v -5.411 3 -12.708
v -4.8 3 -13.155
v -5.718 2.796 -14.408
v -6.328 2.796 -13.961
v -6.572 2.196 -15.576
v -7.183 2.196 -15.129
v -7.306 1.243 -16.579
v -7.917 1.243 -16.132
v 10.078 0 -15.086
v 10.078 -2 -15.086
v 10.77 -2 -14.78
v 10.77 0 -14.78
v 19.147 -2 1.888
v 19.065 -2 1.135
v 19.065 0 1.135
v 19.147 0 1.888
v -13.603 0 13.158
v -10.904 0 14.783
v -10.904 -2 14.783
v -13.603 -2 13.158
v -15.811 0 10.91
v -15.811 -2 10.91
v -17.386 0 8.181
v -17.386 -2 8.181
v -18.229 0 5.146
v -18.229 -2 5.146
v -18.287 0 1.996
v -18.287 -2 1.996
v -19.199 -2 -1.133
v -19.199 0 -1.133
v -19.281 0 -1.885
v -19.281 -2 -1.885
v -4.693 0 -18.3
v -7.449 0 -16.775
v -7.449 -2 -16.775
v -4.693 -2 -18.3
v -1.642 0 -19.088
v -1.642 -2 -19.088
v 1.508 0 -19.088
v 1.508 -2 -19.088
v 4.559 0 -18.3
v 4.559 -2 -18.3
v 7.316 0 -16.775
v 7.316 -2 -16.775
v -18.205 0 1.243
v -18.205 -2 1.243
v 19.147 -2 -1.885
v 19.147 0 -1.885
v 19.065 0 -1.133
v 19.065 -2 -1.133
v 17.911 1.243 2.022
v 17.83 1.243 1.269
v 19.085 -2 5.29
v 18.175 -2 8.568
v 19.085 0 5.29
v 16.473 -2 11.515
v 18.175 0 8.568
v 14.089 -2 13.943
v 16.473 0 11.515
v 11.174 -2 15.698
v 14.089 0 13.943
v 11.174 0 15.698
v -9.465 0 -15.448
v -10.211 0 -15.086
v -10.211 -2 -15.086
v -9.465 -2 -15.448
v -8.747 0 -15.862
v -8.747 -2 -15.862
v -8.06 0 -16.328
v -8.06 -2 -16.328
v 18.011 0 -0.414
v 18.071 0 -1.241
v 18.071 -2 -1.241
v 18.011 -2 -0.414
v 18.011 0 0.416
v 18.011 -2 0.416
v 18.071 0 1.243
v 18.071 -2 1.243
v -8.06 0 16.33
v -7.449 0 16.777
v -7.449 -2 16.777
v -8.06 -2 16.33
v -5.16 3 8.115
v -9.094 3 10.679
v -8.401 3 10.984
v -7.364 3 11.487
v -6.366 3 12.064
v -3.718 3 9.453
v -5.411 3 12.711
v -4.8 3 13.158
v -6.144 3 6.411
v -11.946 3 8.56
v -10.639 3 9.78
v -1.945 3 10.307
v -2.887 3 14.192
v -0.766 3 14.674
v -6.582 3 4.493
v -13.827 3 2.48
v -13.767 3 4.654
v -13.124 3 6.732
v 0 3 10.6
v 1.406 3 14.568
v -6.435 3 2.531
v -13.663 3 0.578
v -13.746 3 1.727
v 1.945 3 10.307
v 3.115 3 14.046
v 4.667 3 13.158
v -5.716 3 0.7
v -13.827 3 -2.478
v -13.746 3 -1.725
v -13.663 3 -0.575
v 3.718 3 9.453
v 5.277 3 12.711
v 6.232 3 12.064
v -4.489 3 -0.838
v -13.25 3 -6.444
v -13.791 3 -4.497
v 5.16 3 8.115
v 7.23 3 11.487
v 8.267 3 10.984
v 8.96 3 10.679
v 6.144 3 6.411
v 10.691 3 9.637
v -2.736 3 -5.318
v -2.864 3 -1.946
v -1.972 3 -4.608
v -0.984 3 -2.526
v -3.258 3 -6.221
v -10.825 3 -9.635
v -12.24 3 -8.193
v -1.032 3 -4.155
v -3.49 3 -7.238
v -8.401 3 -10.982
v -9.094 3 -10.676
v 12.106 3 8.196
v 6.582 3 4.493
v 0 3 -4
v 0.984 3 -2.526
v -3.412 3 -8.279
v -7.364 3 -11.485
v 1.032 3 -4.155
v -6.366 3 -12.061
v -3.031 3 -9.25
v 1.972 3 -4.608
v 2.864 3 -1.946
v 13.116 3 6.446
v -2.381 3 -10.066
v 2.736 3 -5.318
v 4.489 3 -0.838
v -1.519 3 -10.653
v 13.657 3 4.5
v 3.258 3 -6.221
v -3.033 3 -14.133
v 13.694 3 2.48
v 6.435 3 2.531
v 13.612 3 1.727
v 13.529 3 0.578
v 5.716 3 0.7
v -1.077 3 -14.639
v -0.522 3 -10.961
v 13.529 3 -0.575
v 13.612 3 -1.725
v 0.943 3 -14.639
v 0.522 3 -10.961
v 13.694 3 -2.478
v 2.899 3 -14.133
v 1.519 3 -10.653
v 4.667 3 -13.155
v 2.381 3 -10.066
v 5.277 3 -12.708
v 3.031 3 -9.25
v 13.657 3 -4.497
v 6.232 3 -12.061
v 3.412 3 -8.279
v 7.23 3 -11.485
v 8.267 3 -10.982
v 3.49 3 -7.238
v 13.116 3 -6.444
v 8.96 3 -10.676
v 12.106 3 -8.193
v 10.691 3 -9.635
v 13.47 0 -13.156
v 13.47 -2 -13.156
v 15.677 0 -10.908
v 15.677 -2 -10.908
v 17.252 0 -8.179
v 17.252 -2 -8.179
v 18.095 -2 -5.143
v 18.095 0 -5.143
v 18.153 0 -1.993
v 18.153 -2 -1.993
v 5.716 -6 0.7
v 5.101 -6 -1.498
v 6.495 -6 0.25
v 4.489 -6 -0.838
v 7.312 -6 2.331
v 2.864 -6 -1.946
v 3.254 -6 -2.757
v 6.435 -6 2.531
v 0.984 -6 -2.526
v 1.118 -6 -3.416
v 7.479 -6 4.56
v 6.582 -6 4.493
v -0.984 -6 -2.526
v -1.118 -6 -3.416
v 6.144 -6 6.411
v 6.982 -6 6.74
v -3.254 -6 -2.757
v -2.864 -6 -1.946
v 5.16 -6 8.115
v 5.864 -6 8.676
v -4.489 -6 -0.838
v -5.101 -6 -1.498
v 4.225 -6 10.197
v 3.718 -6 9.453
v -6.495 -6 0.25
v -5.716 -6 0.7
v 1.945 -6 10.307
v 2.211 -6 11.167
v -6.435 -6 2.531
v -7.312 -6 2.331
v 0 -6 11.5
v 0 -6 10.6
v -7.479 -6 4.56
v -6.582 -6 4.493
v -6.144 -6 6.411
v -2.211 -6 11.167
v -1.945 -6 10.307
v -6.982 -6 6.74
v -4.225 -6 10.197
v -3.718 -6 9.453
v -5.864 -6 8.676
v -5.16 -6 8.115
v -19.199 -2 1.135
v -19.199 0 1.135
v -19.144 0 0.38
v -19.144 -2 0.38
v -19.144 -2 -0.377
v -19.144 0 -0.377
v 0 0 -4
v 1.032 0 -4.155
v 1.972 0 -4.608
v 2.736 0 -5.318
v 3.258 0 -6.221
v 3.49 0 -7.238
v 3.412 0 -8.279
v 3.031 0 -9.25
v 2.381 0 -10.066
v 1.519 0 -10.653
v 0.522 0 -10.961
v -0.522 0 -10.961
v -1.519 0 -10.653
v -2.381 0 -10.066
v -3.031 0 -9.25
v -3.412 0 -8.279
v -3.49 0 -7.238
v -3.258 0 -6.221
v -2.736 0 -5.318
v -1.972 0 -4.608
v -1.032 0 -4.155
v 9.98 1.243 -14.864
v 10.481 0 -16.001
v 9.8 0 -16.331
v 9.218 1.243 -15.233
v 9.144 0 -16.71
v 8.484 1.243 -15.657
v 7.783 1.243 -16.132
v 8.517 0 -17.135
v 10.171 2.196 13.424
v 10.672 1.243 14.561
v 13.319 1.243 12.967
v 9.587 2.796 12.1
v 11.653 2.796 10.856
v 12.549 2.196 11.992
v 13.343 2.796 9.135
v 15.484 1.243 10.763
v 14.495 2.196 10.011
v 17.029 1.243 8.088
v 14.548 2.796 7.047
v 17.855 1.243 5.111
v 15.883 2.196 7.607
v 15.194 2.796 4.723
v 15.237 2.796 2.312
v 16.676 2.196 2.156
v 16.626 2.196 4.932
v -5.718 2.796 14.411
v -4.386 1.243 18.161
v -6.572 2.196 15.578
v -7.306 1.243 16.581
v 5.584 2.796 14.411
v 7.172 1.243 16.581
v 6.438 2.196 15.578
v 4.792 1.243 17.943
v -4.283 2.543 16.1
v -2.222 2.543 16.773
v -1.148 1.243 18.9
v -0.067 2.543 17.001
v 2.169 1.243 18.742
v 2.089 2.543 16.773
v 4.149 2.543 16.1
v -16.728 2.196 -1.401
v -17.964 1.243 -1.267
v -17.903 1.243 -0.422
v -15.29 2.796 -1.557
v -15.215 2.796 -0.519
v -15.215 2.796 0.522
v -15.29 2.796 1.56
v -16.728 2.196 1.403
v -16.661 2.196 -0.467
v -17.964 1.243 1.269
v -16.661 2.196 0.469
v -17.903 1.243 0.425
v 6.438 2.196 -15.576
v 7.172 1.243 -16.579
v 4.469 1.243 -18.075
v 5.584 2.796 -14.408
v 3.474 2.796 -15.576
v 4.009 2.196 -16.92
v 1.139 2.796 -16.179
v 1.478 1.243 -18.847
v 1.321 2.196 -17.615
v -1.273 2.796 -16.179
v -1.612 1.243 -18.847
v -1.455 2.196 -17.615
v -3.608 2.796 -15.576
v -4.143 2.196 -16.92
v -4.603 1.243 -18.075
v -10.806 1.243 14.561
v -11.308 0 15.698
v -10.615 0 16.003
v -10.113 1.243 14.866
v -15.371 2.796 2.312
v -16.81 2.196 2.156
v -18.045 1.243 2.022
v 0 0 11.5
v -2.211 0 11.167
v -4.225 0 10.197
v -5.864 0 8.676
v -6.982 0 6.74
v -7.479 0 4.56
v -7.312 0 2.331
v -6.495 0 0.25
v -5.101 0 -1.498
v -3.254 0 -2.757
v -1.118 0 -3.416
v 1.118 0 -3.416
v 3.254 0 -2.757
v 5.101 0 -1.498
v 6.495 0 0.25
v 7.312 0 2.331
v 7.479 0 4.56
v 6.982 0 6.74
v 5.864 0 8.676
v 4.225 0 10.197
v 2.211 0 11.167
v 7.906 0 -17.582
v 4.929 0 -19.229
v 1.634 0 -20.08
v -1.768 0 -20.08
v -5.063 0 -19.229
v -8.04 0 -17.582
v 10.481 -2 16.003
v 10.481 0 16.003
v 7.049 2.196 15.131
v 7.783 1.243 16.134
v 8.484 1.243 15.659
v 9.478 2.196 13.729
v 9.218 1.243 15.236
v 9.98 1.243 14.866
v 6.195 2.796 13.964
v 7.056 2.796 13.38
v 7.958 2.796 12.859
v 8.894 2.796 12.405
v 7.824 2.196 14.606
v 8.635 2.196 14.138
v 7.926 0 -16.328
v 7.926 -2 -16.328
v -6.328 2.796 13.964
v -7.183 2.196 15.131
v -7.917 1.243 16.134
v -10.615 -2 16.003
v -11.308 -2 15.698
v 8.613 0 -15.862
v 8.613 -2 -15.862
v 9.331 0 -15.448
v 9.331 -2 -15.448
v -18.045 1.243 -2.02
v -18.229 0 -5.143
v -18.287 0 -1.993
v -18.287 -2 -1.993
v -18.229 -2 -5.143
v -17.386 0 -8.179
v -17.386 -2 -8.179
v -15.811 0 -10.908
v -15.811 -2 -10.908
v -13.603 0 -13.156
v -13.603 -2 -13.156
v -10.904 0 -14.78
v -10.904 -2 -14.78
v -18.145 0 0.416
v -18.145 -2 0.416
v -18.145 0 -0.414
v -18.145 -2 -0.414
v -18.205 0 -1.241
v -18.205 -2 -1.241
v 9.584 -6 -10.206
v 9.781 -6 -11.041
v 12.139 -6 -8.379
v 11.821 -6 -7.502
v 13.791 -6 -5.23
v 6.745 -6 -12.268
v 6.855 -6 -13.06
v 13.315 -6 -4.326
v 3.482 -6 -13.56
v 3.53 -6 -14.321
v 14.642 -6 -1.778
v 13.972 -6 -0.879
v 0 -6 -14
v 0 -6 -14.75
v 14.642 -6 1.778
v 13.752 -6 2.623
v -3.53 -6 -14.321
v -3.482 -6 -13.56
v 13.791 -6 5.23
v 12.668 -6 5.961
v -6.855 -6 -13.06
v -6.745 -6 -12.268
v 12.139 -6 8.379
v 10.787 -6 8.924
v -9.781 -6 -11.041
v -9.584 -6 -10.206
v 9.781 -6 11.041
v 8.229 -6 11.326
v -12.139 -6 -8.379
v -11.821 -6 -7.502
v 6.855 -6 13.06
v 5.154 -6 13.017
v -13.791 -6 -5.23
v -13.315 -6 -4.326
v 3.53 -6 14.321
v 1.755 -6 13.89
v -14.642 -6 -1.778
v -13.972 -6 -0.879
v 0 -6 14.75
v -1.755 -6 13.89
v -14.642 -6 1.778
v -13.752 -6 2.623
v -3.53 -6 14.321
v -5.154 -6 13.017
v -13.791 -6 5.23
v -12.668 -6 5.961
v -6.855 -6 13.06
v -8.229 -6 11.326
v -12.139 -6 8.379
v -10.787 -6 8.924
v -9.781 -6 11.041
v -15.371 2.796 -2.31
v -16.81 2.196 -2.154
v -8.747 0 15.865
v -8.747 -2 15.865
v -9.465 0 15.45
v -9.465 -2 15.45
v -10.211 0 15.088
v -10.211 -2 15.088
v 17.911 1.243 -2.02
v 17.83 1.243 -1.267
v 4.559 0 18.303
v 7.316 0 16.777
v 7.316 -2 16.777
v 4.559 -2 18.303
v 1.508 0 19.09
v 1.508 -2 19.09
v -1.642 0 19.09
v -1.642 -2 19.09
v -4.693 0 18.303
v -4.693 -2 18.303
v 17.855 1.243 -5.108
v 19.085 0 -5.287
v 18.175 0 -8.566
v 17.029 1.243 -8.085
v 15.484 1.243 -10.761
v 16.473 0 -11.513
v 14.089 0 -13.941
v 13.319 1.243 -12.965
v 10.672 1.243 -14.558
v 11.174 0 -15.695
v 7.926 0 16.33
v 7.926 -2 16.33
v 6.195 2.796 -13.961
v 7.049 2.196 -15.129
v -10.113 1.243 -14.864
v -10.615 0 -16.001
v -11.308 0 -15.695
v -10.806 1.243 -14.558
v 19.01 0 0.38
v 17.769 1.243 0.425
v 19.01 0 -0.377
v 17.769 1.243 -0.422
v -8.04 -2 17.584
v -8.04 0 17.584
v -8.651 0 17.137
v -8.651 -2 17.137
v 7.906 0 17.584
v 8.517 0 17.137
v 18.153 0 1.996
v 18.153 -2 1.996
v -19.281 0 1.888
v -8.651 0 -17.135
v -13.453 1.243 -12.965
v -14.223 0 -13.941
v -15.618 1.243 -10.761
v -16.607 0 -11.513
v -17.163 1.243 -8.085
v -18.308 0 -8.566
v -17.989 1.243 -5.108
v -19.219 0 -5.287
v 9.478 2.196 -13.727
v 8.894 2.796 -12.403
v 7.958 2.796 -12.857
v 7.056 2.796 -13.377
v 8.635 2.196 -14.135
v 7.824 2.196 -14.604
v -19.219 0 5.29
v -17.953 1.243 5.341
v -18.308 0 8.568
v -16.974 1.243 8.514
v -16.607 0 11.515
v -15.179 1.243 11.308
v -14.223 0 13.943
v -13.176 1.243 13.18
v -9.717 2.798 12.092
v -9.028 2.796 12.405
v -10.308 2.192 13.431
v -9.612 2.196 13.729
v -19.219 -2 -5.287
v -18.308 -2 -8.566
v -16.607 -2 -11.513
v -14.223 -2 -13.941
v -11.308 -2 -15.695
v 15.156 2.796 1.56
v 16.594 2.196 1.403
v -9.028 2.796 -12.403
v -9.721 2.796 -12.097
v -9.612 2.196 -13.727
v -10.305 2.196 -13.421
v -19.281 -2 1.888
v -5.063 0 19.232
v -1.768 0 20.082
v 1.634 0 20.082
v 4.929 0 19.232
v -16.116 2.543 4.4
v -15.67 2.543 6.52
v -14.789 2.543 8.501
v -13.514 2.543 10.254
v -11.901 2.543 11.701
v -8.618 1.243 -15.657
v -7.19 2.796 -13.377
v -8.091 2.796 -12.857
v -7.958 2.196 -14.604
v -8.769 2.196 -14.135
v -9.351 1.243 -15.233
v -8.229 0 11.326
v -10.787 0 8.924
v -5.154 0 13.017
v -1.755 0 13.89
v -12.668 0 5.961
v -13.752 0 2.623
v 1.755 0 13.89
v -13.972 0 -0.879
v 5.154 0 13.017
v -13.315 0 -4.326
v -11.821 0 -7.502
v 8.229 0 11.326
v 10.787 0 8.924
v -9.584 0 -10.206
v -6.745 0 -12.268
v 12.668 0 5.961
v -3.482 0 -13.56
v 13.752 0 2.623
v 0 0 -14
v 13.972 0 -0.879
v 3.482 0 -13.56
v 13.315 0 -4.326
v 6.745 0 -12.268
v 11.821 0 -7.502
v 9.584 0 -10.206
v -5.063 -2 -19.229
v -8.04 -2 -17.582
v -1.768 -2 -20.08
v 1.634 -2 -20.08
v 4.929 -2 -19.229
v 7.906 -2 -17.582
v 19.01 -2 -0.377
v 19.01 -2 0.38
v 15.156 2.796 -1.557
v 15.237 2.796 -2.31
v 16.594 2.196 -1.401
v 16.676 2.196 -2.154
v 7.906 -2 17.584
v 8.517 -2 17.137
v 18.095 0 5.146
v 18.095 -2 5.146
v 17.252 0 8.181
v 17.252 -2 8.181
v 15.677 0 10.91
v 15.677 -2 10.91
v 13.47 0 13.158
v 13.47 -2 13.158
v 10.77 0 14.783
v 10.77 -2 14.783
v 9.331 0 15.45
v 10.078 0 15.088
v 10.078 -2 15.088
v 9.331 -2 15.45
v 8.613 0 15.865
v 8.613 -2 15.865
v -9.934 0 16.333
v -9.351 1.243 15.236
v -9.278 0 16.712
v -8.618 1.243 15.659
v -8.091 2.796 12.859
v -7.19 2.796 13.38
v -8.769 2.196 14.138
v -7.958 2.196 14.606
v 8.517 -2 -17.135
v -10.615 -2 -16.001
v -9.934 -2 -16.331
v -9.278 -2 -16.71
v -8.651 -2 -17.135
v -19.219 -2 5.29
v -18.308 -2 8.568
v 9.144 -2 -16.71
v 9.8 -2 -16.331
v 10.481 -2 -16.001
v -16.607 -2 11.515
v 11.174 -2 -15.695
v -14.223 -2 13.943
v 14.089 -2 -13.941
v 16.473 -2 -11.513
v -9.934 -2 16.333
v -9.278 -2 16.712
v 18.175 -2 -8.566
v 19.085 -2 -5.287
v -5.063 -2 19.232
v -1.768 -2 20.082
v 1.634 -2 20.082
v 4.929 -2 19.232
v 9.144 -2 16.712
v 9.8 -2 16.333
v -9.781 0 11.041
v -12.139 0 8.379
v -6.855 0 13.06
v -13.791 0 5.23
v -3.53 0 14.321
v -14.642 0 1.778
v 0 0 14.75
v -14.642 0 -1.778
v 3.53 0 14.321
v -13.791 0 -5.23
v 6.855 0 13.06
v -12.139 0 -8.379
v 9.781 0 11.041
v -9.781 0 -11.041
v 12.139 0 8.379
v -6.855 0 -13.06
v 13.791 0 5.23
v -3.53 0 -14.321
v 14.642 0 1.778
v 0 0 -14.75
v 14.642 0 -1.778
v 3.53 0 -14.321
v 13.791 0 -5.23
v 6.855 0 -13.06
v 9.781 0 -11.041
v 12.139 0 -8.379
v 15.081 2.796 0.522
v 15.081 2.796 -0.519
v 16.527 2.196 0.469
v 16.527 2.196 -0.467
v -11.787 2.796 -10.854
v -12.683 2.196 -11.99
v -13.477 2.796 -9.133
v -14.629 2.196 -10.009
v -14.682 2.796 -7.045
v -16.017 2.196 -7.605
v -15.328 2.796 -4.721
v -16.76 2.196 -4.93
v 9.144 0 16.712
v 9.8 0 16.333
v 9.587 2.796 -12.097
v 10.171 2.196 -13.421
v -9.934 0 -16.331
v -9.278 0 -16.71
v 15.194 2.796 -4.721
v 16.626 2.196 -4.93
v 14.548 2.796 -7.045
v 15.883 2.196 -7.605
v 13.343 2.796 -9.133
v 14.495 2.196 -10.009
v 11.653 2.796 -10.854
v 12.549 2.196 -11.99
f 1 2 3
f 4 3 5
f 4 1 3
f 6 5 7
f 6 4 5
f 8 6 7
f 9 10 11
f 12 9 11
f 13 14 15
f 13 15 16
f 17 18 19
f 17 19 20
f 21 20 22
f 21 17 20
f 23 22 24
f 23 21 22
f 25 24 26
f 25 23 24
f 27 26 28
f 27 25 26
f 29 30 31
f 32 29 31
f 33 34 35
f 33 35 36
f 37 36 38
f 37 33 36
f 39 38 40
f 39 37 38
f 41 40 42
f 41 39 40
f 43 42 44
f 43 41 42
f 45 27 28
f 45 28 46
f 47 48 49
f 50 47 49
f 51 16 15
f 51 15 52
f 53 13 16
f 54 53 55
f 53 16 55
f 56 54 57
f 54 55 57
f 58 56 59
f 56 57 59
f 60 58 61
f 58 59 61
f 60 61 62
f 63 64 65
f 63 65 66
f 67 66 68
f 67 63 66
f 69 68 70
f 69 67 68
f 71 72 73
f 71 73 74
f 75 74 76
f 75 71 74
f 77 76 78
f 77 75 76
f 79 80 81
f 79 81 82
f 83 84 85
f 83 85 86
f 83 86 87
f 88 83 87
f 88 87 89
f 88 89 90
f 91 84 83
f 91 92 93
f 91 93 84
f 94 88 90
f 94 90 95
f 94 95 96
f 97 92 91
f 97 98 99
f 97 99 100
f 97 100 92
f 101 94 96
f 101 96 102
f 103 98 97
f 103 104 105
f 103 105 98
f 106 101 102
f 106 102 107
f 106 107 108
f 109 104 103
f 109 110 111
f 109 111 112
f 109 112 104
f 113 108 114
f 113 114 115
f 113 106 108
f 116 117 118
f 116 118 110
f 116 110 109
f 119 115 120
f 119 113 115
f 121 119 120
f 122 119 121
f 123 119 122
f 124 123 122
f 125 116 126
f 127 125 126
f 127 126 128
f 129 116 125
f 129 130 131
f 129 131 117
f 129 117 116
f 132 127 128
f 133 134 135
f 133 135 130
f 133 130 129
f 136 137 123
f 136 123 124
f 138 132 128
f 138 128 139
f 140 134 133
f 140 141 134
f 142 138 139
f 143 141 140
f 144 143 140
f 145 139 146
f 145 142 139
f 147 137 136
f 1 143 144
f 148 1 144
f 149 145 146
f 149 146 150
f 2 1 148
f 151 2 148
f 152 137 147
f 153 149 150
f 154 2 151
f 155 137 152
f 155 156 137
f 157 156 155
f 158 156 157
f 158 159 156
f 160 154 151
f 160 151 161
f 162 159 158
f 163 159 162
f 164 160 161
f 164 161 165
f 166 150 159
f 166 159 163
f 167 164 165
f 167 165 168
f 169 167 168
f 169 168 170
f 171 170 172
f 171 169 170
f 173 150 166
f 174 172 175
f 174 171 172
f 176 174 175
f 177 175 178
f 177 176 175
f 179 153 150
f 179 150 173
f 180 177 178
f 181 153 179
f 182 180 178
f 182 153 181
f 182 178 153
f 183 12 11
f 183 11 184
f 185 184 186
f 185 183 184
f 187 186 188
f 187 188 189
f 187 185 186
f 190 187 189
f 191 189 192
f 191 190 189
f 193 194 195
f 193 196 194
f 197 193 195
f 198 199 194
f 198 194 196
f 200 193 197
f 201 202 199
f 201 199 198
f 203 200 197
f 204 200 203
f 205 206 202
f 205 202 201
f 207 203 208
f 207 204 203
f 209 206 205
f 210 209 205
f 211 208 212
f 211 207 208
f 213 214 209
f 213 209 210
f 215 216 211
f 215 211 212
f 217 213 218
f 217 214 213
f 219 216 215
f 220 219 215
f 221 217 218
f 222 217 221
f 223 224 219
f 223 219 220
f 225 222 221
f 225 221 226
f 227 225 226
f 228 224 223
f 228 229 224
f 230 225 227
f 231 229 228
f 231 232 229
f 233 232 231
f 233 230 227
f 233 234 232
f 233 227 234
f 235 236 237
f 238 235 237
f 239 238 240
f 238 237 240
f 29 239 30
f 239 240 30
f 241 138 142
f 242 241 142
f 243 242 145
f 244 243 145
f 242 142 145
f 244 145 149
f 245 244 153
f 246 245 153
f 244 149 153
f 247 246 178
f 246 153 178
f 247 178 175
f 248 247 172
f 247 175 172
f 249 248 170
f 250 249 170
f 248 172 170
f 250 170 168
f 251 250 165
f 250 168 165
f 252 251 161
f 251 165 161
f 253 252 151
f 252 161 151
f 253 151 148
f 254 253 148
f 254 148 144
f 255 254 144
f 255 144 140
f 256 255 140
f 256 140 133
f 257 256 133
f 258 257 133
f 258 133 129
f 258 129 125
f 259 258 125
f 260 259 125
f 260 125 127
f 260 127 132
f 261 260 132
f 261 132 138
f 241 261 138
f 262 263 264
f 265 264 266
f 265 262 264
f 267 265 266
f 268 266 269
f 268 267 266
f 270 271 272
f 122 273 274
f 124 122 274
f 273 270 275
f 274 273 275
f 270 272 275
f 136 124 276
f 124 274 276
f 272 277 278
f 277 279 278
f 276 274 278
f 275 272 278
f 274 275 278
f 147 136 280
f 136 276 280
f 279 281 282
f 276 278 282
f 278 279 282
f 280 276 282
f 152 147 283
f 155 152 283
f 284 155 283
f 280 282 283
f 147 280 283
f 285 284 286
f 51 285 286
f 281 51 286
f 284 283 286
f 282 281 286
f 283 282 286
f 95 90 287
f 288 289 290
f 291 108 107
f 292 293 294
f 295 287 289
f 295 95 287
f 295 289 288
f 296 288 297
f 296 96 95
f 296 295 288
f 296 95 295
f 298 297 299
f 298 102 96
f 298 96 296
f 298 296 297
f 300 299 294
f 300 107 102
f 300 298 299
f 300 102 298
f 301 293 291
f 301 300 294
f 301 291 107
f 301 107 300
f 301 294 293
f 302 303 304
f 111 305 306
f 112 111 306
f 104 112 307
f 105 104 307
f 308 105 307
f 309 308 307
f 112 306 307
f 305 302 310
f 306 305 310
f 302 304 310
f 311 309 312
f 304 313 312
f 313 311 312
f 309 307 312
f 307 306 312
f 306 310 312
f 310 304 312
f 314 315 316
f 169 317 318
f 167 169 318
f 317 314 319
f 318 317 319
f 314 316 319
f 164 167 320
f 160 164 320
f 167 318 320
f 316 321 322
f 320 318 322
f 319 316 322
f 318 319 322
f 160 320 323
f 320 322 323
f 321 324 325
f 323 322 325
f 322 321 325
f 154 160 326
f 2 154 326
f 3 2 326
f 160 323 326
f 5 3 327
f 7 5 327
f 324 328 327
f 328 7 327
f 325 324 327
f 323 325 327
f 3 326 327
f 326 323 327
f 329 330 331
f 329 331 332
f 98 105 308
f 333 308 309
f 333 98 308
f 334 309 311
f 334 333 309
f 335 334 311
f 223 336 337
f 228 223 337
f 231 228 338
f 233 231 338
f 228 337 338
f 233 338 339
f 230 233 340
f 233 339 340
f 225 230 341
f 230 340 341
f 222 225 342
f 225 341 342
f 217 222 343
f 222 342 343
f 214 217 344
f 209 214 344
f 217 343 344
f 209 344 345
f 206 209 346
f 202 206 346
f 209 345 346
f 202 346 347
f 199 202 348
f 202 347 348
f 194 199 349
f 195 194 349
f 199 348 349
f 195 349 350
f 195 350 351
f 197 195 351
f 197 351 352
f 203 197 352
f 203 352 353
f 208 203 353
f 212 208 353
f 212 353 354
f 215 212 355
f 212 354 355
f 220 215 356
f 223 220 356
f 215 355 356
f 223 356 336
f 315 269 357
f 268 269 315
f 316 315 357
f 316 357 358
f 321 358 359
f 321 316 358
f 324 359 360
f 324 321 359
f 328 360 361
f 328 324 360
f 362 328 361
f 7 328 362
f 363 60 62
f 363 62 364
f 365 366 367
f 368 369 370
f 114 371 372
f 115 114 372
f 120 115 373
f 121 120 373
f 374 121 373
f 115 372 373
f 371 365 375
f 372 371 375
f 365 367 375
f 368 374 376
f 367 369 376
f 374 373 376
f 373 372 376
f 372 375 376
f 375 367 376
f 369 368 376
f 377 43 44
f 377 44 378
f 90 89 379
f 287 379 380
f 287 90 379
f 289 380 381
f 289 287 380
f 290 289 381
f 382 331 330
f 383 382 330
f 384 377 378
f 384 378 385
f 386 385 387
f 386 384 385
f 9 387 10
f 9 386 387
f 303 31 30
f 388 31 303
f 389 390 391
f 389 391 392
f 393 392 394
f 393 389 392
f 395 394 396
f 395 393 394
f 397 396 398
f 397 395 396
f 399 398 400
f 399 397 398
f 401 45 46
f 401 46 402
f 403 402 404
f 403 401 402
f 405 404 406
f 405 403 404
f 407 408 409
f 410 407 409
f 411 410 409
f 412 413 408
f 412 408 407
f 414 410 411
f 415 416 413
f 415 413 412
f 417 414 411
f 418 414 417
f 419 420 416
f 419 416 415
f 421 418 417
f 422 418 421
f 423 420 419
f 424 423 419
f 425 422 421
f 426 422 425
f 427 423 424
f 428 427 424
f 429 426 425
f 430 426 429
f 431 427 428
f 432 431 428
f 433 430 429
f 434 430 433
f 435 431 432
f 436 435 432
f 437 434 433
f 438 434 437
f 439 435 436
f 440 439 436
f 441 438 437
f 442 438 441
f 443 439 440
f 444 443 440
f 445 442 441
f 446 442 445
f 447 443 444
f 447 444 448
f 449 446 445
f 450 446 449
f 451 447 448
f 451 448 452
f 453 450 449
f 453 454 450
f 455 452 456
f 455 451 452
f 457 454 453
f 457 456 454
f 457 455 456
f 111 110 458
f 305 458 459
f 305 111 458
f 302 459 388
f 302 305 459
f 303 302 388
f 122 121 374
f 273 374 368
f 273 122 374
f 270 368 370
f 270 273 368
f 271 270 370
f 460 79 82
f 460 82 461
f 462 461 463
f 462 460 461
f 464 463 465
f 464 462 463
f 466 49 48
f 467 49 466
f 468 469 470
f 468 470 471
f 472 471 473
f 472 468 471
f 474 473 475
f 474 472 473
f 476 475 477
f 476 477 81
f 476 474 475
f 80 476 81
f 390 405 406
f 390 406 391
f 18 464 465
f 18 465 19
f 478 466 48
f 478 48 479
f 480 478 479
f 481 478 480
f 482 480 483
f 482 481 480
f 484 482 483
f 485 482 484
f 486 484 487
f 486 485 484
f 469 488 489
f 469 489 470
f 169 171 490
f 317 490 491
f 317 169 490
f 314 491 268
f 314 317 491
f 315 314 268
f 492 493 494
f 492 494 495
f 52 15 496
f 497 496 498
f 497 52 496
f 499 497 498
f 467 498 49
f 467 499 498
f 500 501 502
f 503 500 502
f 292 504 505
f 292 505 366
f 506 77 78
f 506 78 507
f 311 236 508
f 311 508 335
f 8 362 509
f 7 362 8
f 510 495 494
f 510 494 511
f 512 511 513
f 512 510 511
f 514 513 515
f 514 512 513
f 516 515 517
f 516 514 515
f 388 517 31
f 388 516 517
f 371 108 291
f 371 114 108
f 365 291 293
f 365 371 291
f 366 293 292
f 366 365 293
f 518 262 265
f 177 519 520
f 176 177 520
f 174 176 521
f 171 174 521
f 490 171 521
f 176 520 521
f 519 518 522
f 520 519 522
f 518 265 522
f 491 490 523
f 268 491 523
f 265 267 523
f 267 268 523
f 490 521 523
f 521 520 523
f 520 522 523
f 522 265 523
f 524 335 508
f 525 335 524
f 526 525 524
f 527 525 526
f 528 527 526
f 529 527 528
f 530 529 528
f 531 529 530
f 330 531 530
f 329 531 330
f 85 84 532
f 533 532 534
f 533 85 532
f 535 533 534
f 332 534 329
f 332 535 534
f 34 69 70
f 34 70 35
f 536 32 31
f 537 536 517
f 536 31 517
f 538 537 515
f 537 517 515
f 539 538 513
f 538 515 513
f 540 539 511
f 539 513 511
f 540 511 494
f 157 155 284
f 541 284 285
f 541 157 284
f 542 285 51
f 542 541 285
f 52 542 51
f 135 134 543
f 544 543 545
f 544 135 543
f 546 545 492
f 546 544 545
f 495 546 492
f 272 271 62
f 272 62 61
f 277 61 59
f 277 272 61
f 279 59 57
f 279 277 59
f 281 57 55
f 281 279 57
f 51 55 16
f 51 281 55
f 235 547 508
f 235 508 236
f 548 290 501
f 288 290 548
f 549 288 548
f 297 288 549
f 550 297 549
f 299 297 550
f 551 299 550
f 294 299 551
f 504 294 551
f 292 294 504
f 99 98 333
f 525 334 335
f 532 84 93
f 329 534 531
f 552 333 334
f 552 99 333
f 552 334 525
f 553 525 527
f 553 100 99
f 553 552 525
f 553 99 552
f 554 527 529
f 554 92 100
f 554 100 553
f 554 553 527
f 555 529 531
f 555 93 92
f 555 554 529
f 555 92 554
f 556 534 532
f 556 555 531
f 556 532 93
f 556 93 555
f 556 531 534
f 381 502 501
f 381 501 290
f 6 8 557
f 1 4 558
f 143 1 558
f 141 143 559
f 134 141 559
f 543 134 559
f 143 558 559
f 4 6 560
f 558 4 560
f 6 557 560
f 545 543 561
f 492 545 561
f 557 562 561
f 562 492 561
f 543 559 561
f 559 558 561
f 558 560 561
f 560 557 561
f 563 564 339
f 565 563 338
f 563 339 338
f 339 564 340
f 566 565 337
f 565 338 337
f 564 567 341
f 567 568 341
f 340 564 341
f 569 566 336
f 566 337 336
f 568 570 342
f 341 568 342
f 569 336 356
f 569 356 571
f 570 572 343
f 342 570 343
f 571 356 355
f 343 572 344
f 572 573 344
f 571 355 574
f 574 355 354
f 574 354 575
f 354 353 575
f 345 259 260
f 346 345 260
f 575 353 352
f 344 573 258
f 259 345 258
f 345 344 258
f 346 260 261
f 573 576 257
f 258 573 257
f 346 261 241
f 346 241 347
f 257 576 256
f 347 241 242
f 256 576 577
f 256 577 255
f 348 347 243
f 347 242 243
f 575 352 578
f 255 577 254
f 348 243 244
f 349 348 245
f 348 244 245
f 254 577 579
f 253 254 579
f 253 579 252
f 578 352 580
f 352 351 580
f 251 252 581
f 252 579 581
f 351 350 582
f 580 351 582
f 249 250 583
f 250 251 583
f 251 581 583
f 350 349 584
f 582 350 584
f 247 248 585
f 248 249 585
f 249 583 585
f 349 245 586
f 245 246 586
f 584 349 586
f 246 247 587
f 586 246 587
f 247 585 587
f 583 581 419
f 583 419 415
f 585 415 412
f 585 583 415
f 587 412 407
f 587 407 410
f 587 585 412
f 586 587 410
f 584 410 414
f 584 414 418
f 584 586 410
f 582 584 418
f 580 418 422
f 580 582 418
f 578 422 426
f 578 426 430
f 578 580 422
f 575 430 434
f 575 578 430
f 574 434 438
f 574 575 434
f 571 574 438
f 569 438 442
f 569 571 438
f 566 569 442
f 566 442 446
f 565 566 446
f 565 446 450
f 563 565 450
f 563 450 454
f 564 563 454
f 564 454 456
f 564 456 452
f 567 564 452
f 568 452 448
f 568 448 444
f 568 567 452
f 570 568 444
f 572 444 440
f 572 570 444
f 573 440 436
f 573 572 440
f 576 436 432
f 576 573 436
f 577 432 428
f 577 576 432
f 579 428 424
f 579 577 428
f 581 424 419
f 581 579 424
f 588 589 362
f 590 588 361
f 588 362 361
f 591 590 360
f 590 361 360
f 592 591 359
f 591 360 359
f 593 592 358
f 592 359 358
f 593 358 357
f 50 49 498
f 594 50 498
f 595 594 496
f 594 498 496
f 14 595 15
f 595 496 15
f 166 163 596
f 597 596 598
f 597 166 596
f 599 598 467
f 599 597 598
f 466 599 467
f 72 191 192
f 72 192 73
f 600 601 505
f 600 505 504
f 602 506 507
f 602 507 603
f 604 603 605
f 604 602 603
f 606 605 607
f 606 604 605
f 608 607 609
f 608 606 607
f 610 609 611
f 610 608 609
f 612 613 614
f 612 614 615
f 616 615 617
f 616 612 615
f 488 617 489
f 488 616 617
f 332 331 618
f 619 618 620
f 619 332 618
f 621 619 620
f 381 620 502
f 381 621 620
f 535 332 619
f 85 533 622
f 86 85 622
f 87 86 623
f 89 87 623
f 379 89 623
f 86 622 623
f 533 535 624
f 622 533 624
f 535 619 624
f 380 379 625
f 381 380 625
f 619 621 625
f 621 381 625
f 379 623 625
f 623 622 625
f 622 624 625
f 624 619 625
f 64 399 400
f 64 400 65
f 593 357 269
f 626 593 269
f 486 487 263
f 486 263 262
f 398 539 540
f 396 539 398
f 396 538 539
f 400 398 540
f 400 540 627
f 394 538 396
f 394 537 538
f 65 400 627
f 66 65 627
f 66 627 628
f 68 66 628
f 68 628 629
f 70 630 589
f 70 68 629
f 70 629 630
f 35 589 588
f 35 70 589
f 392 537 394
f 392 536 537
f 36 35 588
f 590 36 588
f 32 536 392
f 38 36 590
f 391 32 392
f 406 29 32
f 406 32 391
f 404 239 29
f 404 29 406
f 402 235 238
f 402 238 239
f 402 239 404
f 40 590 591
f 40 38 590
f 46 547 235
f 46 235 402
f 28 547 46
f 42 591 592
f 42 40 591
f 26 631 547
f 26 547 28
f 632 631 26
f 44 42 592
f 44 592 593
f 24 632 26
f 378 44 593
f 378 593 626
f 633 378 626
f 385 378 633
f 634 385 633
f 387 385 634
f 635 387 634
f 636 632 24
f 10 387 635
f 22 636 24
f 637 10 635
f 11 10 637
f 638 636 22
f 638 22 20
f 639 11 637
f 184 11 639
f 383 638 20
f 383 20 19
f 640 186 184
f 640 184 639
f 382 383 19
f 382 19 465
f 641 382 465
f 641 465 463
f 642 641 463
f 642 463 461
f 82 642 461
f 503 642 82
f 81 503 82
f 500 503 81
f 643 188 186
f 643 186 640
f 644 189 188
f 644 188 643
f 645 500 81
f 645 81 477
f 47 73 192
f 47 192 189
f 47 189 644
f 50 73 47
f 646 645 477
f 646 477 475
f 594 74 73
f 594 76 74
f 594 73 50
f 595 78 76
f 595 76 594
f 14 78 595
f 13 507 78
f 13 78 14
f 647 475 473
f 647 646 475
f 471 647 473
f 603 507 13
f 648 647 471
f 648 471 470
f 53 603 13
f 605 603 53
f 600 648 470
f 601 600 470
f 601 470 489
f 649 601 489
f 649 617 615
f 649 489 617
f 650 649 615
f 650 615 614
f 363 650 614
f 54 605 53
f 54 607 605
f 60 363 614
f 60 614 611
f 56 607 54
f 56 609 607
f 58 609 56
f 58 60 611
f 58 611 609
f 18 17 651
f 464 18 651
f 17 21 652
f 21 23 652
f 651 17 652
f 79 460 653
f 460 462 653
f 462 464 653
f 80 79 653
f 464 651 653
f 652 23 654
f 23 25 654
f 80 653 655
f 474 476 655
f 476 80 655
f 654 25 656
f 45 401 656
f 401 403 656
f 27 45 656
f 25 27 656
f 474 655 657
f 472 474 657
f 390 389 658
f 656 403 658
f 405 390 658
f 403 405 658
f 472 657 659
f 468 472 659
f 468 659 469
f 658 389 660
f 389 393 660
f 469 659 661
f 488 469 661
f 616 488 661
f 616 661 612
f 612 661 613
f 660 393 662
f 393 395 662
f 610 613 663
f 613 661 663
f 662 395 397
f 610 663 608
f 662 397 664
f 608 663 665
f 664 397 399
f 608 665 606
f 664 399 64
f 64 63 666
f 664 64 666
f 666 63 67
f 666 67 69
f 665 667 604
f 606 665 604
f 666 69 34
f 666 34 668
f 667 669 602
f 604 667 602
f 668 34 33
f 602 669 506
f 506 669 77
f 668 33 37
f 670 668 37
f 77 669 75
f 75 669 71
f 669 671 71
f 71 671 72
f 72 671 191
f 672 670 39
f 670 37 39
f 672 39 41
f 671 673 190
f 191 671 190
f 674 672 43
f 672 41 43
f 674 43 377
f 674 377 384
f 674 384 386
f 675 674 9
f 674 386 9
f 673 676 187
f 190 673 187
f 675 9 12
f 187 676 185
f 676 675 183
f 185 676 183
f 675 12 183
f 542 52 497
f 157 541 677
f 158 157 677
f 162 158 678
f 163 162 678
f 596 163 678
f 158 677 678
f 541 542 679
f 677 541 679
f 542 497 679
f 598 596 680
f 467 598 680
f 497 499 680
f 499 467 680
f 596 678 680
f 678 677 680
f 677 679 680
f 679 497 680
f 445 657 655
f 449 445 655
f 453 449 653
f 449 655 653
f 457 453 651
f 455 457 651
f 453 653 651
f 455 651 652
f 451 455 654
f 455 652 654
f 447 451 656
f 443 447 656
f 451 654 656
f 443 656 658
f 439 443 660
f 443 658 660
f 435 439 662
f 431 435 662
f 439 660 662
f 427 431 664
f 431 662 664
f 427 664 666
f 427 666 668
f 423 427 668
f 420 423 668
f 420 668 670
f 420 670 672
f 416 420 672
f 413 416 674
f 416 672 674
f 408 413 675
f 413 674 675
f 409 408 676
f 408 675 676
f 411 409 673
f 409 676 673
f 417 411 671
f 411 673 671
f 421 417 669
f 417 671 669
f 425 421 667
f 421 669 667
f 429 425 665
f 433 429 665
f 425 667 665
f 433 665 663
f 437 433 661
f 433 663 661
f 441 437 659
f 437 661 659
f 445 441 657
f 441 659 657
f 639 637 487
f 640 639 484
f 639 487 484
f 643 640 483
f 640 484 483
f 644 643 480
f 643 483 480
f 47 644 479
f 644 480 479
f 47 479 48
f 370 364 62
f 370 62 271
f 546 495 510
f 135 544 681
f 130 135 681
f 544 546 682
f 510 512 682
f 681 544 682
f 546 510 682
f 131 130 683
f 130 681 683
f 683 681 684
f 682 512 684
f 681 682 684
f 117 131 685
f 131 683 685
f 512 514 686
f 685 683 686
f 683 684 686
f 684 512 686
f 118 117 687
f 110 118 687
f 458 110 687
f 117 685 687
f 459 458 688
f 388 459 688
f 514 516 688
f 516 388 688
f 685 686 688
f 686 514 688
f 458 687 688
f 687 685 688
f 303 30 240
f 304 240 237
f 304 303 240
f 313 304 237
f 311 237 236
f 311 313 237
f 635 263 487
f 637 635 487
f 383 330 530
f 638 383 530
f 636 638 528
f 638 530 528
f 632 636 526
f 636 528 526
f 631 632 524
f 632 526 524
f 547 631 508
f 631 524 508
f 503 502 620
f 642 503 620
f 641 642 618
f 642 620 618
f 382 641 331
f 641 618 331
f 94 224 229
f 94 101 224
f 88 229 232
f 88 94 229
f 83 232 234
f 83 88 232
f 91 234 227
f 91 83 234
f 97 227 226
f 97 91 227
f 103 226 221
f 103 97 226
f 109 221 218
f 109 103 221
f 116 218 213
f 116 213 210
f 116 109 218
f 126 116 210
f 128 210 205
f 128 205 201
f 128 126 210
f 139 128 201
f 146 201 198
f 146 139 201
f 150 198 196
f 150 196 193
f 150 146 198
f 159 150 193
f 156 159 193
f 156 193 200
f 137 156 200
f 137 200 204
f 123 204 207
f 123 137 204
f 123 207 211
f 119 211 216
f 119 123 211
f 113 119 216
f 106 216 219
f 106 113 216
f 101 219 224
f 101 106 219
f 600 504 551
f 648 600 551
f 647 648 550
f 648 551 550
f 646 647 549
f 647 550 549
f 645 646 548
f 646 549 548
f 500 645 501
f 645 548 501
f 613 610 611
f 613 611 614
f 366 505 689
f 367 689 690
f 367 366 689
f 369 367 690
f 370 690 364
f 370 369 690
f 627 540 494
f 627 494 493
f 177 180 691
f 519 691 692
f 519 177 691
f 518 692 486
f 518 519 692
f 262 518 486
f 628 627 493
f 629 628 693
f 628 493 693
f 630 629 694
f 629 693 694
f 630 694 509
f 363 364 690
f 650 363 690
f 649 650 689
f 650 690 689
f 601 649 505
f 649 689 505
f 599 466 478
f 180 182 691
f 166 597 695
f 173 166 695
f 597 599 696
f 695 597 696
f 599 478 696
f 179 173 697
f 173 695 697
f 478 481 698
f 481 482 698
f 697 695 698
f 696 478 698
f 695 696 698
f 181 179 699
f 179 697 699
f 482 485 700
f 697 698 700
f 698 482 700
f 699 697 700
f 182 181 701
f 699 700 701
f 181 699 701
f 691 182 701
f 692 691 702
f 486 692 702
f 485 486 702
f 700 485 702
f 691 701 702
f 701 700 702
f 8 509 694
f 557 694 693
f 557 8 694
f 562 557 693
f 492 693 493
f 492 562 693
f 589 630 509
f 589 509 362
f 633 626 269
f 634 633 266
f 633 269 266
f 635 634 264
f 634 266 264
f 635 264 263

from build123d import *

# Parameters (mm, degrees)
EXTRUDE_1_DEPTH     = 3
CHAMFER_1_SIZE      = 4.5
SKETCH_3_R          = 14.75
SKETCH_3_R_2        = 14
EXTRUDE_2_DEPTH     = 6
FILLET_1_R          = 6
SKETCH_4_R          = 6.6
SKETCH_4_R_2        = 3.5
CUT_EXTRUDE_1_DEPTH = 10
SKETCH_5_R          = 7.5
SKETCH_5_R_2        = 6.6
EXTRUDE_3_DEPTH     = 6
EXTRUDE_4_DEPTH     = 2


with BuildPart() as part:
    # 草圖1 → 填料-伸長1 (new body)
    with BuildSketch(Plane(origin=(0, 0, 0), x_dir=(1, 0, 0), z_dir=(0, 1, 0))):
        with BuildLine():
            Line((-20.771924176, 1.723359404), (-20.69017274, 0.970783701))
            ThreePointArc((-20.69017274, 0.970783701), (-20.637537093, -0.00115824), (-20.69017274, -0.973100181))
            Line((-20.69017274, -0.973100181), (-20.771924176, -1.725675885))
            ThreePointArc((-20.771924176, -1.725675885), (-18.850031312, -10.84557912), (-11.912909862, -17.069938782))
            Line((-11.912909862, -17.069938782), (-11.220284466, -17.375427813))
            ThreePointArc((-11.220284466, -17.375427813), (-10.352240231, -17.815814976), (-9.536831642, -18.347369754))
            Line((-9.536831642, -18.347369754), (-8.925957683, -18.794456427))
            ThreePointArc((-8.925957683, -18.794456427), (-0.066943369, -21.69), (8.792070945, -18.794456427))
            Line((8.792070945, -18.794456427), (9.402944904, -18.347369754))
            ThreePointArc((9.402944904, -18.347369754), (10.218353493, -17.815814976), (11.086397728, -17.375427813))
            Line((11.086397728, -17.375427813), (11.779023124, -17.069938782))
            ThreePointArc((11.779023124, -17.069938782), (18.716144574, -10.84557912), (20.638037438, -1.725675885))
            Line((20.638037438, -1.725675885), (20.556286002, -0.973100181))
            ThreePointArc((20.556286002, -0.973100181), (20.503650354, -0.00115824), (20.556286002, 0.970783701))
            Line((20.556286002, 0.970783701), (20.638037438, 1.723359404))
            ThreePointArc((20.638037438, 1.723359404), (18.716144574, 10.84326264), (11.779023124, 17.067622301))
            Line((11.779023124, 17.067622301), (11.086397728, 17.373111332))
            ThreePointArc((11.086397728, 17.373111332), (10.218353493, 17.813498495), (9.402944904, 18.345053273))
            Line((9.402944904, 18.345053273), (8.792070945, 18.792139946))
            ThreePointArc((8.792070945, 18.792139946), (-0.066943369, 21.68768352), (-8.925957683, 18.792139946))
            Line((-8.925957683, 18.792139946), (-9.536831642, 18.345053273))
            ThreePointArc((-9.536831642, 18.345053273), (-10.352240231, 17.813498495), (-11.220284466, 17.373111332))
            Line((-11.220284466, 17.373111332), (-11.912909862, 17.067622301))
            ThreePointArc((-11.912909862, 17.067622301), (-18.850031312, 10.84326264), (-20.771924176, 1.723359404))
        make_face()
    extrude(amount=EXTRUDE_1_DEPTH)

    # 導角1
    # the kernel refuses this chamfer: 4.5 mm, written as the material it takes off along each edge
    with BuildSketch(Plane(origin=(-0.066943369, 3, -6.68768352), x_dir=(0.5906009542707505, 0, -0.8069637617727817), z_dir=(0.8069637617727817, 0, 0.5906009542707505))) as chamfer_1_piece_1:
        Polygon((15, -CHAMFER_1_SIZE), (15 - CHAMFER_1_SIZE, 0), (15, 0), align=None)
    revolve(axis=Axis((-0.066943369, 3, -6.68768352), (0, 1, 0)), revolution_arc=72.399330687, mode=Mode.SUBTRACT)
    with BuildSketch(Plane(origin=(-8.925957683, 3, -18.792139946), x_dir=(-0.01623909096472269, -0.9996219169112969, -0.022188176022919184), z_dir=(-0.8069637617727913, 0, 0.5906009542707374)), Plane(origin=(9.402944904, 3, -18.345053273), x_dir=(0.01623909096472324, -0.9996219169112966, -0.02218817602291905), z_dir=(-0.8069637617727801, 0, -0.590600954270753)), Plane(origin=(-11.220284466, 3, -17.373111332), x_dir=(-0.011095978617127454, -0.9996219169112966, -0.025157553321276054), z_dir=(-0.9149573107841873, 0, 0.4035506404933192)), Plane(origin=(11.779023124, 3, -17.067622301), x_dir=(0.011095978617127486, -0.9996219169112966, -0.02515755332127604), z_dir=(-0.9149573107841869, 0, -0.4035506404933204)), Plane(origin=(-20.771924176, 3, -1.723359404), x_dir=(-0.027335069581850155, -0.9996219169112966, 0.002969377298356594), z_dir=(0.10799354901139412, 0, 0.9941515947640599)), Plane(origin=(20.556286002, 3, -0.970783701), x_dir=(0.027335069581850155, -0.9996219169112966, 0.0029693772983568475), z_dir=(0.10799354901140323, 0, -0.994151594764059)), Plane(origin=(-20.69017274, 3, 0.973100181), x_dir=(-0.027335069581850155, -0.9996219169112966, -0.002969377298358358), z_dir=(-0.10799354901145754, 0, 0.994151594764053)), Plane(origin=(20.638037438, 3, 1.725675885), x_dir=(0.027335069581850155, -0.9996219169112966, -0.0029693772983564425), z_dir=(-0.10799354901138868, 0, -0.9941515947640606)), Plane(origin=(-11.912909862, 3, 17.069938782), x_dir=(-0.011095978617125555, -0.9996219169112966, 0.025157553321276813), z_dir=(0.9149573107842173, 0, 0.4035506404932512)), Plane(origin=(11.086397728, 3, 17.375427813), x_dir=(0.011095978617127088, -0.9996219169112966, 0.025157553321276047), z_dir=(0.9149573107841922, 0, -0.40355064049330813)), Plane(origin=(-9.536831642, 3, 18.347369754), x_dir=(-0.016239090964723223, -0.9996219169112966, 0.022188176022919063), z_dir=(0.8069637617727805, 0, 0.5906009542707523)), Plane(origin=(8.792070945, 3, 18.794456427), x_dir=(0.016239090964722667, -0.9996219169112969, 0.022188176022919195), z_dir=(0.8069637617727918, 0, -0.5906009542707369))) as chamfer_1_piece_2:
        Polygon((CHAMFER_1_SIZE * 0.999621916911, CHAMFER_1_SIZE * 0.0274958766106), (-CHAMFER_1_SIZE * 0.0274958766106, CHAMFER_1_SIZE * 0.999621916911), (0, 0), align=None)
    extrude(amount=0.757002964, mode=Mode.SUBTRACT)
    with BuildSketch(Plane(origin=(-14.852240231, 3, -25.607727129), x_dir=(0.5906009542707428, 0, 0.8069637617727874), z_dir=(0.8069637617727874, 0, -0.5906009542707428))) as chamfer_1_piece_3:
        Polygon((9, CHAMFER_1_SIZE), (9 + CHAMFER_1_SIZE, 0), (9, 0), align=None)
    revolve(axis=Axis((-14.852240231, 3, -25.607727129), (0, -1, 0)), revolution_arc=12.399330687, mode=Mode.SUBTRACT)
    with BuildSketch(Plane(origin=(14.718353493, 3, -25.607727129), x_dir=(-0.4035506404933155, 0, 0.9149573107841887), z_dir=(0.9149573107841887, 0, 0.4035506404933155))) as chamfer_1_piece_4:
        Polygon((9, CHAMFER_1_SIZE), (9 + CHAMFER_1_SIZE, 0), (9, 0), align=None)
    revolve(axis=Axis((14.718353493, 3, -25.607727129), (0, -1, 0)), revolution_arc=12.399330687, mode=Mode.SUBTRACT)
    with BuildSketch(Plane(origin=(-5.859650255, 3, -3.34326264), x_dir=(-0.4035506404933193, 0, -0.9149573107841873), z_dir=(0.9149573107841873, 0, -0.4035506404933193))) as chamfer_1_piece_5:
        Polygon((15, -CHAMFER_1_SIZE), (15 - CHAMFER_1_SIZE, 0), (15, 0), align=None)
    revolve(axis=Axis((-5.859650255, 3, -3.34326264), (0, 1, 0)), revolution_arc=72.399330687, mode=Mode.SUBTRACT)
    with BuildSketch(Plane(origin=(5.725763517, 3, -3.34326264), x_dir=(0.9941515947640591, 0, 0.10799354901140142), z_dir=(-0.10799354901140142, 0, 0.9941515947640591))) as chamfer_1_piece_6:
        Polygon((15, -CHAMFER_1_SIZE), (15 - CHAMFER_1_SIZE, 0), (15, 0), align=None)
    revolve(axis=Axis((5.725763517, 3, -3.34326264), (0, 1, 0)), revolution_arc=72.399330687, mode=Mode.SUBTRACT)
    with BuildSketch(Plane(origin=(-29.637537093, 3, 0.00115824), x_dir=(0.9941515947640589, 0, -0.10799354901140375), z_dir=(-0.10799354901140375, 0, -0.9941515947640589))) as chamfer_1_piece_7:
        Polygon((9, CHAMFER_1_SIZE), (9 + CHAMFER_1_SIZE, 0), (9, 0), align=None)
    revolve(axis=Axis((-29.637537093, 3, 0.00115824), (0, -1, 0)), revolution_arc=12.399330687, mode=Mode.SUBTRACT)
    with BuildSketch(Plane(origin=(29.503650354, 3, 0.00115824), x_dir=(-0.9941515947640608, 0, 0.1079935490113869), z_dir=(0.1079935490113869, 0, 0.9941515947640608))) as chamfer_1_piece_8:
        Polygon((9, CHAMFER_1_SIZE), (9 + CHAMFER_1_SIZE, 0), (9, 0), align=None)
    revolve(axis=Axis((29.503650354, 3, 0.00115824), (0, -1, 0)), revolution_arc=12.399330687, mode=Mode.SUBTRACT)
    with BuildSketch(Plane(origin=(-5.859650255, 3, 3.34557912), x_dir=(-0.994151594764053, 0, -0.10799354901145736), z_dir=(0.10799354901145736, 0, -0.994151594764053))) as chamfer_1_piece_9:
        Polygon((15, -CHAMFER_1_SIZE), (15 - CHAMFER_1_SIZE, 0), (15, 0), align=None)
    revolve(axis=Axis((-5.859650255, 3, 3.34557912), (0, 1, 0)), revolution_arc=72.399330687, mode=Mode.SUBTRACT)
    with BuildSketch(Plane(origin=(5.725763517, 3, 3.34557912), x_dir=(0.4035506404933145, 0, 0.9149573107841893), z_dir=(-0.9149573107841893, 0, 0.4035506404933145))) as chamfer_1_piece_10:
        Polygon((15, -CHAMFER_1_SIZE), (15 - CHAMFER_1_SIZE, 0), (15, 0), align=None)
    revolve(axis=Axis((5.725763517, 3, 3.34557912), (0, 1, 0)), revolution_arc=72.399330687, mode=Mode.SUBTRACT)
    with BuildSketch(Plane(origin=(-14.852240231, 3, 25.61004361), x_dir=(0.4035506404932408, 0, -0.9149573107842218), z_dir=(-0.9149573107842218, 0, -0.4035506404932408))) as chamfer_1_piece_11:
        Polygon((9, CHAMFER_1_SIZE), (9 + CHAMFER_1_SIZE, 0), (9, 0), align=None)
    revolve(axis=Axis((-14.852240231, 3, 25.61004361), (0, -1, 0)), revolution_arc=12.399330687, mode=Mode.SUBTRACT)
    with BuildSketch(Plane(origin=(14.718353493, 3, 25.61004361), x_dir=(-0.5906009542707262, 0, -0.8069637617727996), z_dir=(-0.8069637617727996, 0, 0.5906009542707262))) as chamfer_1_piece_12:
        Polygon((9, CHAMFER_1_SIZE), (9 + CHAMFER_1_SIZE, 0), (9, 0), align=None)
    revolve(axis=Axis((14.718353493, 3, 25.61004361), (0, -1, 0)), revolution_arc=12.399330687, mode=Mode.SUBTRACT)
    with BuildSketch(Plane(origin=(-0.066943369, 3, 6.69), x_dir=(-0.5906009542707477, 0, 0.8069637617727838), z_dir=(-0.8069637617727838, 0, -0.5906009542707477))) as chamfer_1_piece_13:
        Polygon((15, -CHAMFER_1_SIZE), (15 - CHAMFER_1_SIZE, 0), (15, 0), align=None)
    revolve(axis=Axis((-0.066943369, 3, 6.69), (0, 1, 0)), revolution_arc=72.399330687, mode=Mode.SUBTRACT)

    # 草圖3 → 填料-伸長2 (add)
    with BuildSketch(Plane.XZ):
        with Locations(Location((0, 0, 0), (0, 0, 90))):
            Circle(SKETCH_3_R)
        with Locations(Location((0, 0, 0), (0, 0, 270))):
            Circle(SKETCH_3_R_2, mode=Mode.SUBTRACT)
    extrude(amount=EXTRUDE_2_DEPTH)

    # 圓角1
    fillet_1_edges = [part.edges().sort_by_distance(p)[0] for p in [
        (-0.066943369, 3, 17.19),
        (6.43980363, 3, 14.939576162),
        (-6.573690369, 3, 14.939576162),
        (7.968353493, 3, 13.918700659),
        (-8.102240231, 3, 13.918700659),
        (9.616732544, 3, 13.105375399),
        (-9.750619282, 3, 13.105375399),
        (14.819030257, 3, 8.59557912),
        (-14.952916995, 3, 8.59557912),
        (16.123479543, 3, 1.835359004),
        (-16.257366282, 3, 1.835359004),
        (16.003650354, 3, 0.00115824),
        (-16.137537093, 3, 0.00115824),
        (16.123479543, 3, -1.833042523),
        (-16.257366282, 3, -1.833042523),
        (14.819030257, 3, -8.59326264),
        (-14.952916995, 3, -8.59326264),
        (9.616732544, 3, -13.103058918),
        (-9.750619282, 3, -13.103058918),
        (7.968353493, 3, -13.916384178),
        (-8.102240231, 3, -13.916384178),
        (6.43980363, 3, -14.937259682),
        (-6.573690369, 3, -14.937259682),
        (-0.066943369, 3, -17.18768352),
    ]]
    fillet(fillet_1_edges, radius=FILLET_1_R)

    # 草圖4 → 除料-伸長1 (cut)
    with BuildSketch(Plane(origin=(0, 3, 0), x_dir=(1, 0, 0), z_dir=(0, 1, 0))):
        with Locations(Location((0, -4, 0), (0, 0, 270))):
            Circle(SKETCH_4_R)
        with Locations(Location((0, 7.5, 0), (0, 0, 270))):
            Circle(SKETCH_4_R_2)
    extrude(amount=-CUT_EXTRUDE_1_DEPTH, mode=Mode.SUBTRACT)

    # 草圖5 → 填料-伸長3 (add)
    with BuildSketch(Plane.XZ):
        with Locations(Location((0, 4, 0), (0, 0, 90))):
            Circle(SKETCH_5_R)
        with Locations(Location((0, 4, 0), (0, 0, 90))):
            Circle(SKETCH_5_R_2, mode=Mode.SUBTRACT)
    extrude(amount=EXTRUDE_3_DEPTH)

    # 草圖6 → 填料-伸長4 (add)
    with BuildSketch(Plane.XZ):
        with BuildLine():
            Line((-8.650930211, -17.134607631), (-8.040056252, -17.581694303))
            ThreePointArc((-8.040056252, -17.581694303), (-0.066943369, -20.18768352), (7.906169514, -17.581694303))
            Line((7.906169514, -17.581694303), (8.517043473, -17.134607631))
            ThreePointArc((8.517043473, -17.134607631), (9.468353493, -16.51446039), (10.481071768, -16.000675366))
            Line((10.481071768, -16.000675366), (11.173697163, -15.695186335))
            ThreePointArc((11.173697163, -15.695186335), (17.417106468, -10.09326264), (19.146810046, -1.885349728))
            Line((19.146810046, -1.885349728), (19.065058609, -1.132774024))
            ThreePointArc((19.065058609, -1.132774024), (19.003650354, 0.00115824), (19.065058609, 1.135090505))
            Line((19.065058609, 1.135090505), (19.146810046, 1.887666208))
            ThreePointArc((19.146810046, 1.887666208), (17.417106468, 10.09557912), (11.173697163, 15.697502816))
            Line((11.173697163, 15.697502816), (10.481071768, 16.002991847))
            ThreePointArc((10.481071768, 16.002991847), (9.468353493, 16.51677687), (8.517043473, 17.136924111))
            Line((8.517043473, 17.136924111), (7.906169514, 17.584010784))
            ThreePointArc((7.906169514, 17.584010784), (-0.066943369, 20.19), (-8.040056252, 17.584010784))
            Line((-8.040056252, 17.584010784), (-8.650930211, 17.136924111))
            ThreePointArc((-8.650930211, 17.136924111), (-9.602240231, 16.51677687), (-10.614958506, 16.002991847))
            Line((-10.614958506, 16.002991847), (-11.307583902, 15.697502816))
            ThreePointArc((-11.307583902, 15.697502816), (-17.550993206, 10.09557912), (-19.280696784, 1.887666208))
            Line((-19.280696784, 1.887666208), (-19.198945348, 1.135090505))
            ThreePointArc((-19.198945348, 1.135090505), (-19.137537093, 0.00115824), (-19.198945348, -1.132774024))
            Line((-19.198945348, -1.132774024), (-19.280696784, -1.885349728))
            ThreePointArc((-19.280696784, -1.885349728), (-17.550993206, -10.09326264), (-11.307583902, -15.695186335))
            Line((-11.307583902, -15.695186335), (-10.614958506, -16.000675366))
            ThreePointArc((-10.614958506, -16.000675366), (-9.602240231, -16.51446039), (-8.650930211, -17.134607631))
        make_face()
        with BuildLine():
            Line((-8.060329257, -16.327643869), (-7.449455297, -16.774730542))
            ThreePointArc((-7.449455297, -16.774730542), (-0.066943369, -19.18768352), (7.315568559, -16.774730542))
            Line((7.315568559, -16.774730542), (7.926442519, -16.327643869))
            ThreePointArc((7.926442519, -16.327643869), (8.968353493, -15.648434986), (10.077521127, -15.085718055))
            Line((10.077521127, -15.085718055), (10.770146523, -14.780229024))
            ThreePointArc((10.770146523, -14.780229024), (16.551081064, -9.59326264), (18.152658451, -1.993343277))
            Line((18.152658451, -1.993343277), (18.070907015, -1.240767573))
            ThreePointArc((18.070907015, -1.240767573), (18.003650354, 0.00115824), (18.070907015, 1.243084054))
            Line((18.070907015, 1.243084054), (18.152658451, 1.995659757))
            ThreePointArc((18.152658451, 1.995659757), (16.551081064, 9.59557912), (10.770146523, 14.782545505))
            Line((10.770146523, 14.782545505), (10.077521127, 15.088034536))
            ThreePointArc((10.077521127, 15.088034536), (8.968353493, 15.650751466), (7.926442519, 16.329960349))
            Line((7.926442519, 16.329960349), (7.315568559, 16.777047022))
            ThreePointArc((7.315568559, 16.777047022), (-0.066943369, 19.19), (-7.449455297, 16.777047022))
            Line((-7.449455297, 16.777047022), (-8.060329257, 16.329960349))
            ThreePointArc((-8.060329257, 16.329960349), (-9.102240231, 15.650751466), (-10.211407865, 15.088034536))
            Line((-10.211407865, 15.088034536), (-10.904033261, 14.782545505))
            ThreePointArc((-10.904033261, 14.782545505), (-16.684967802, 9.59557912), (-18.286545189, 1.995659757))
            Line((-18.286545189, 1.995659757), (-18.204793753, 1.243084054))
            ThreePointArc((-18.204793753, 1.243084054), (-18.137537093, 0.00115824), (-18.204793753, -1.240767573))
            Line((-18.204793753, -1.240767573), (-18.286545189, -1.993343277))
            ThreePointArc((-18.286545189, -1.993343277), (-16.684967802, -9.59326264), (-10.904033261, -14.780229024))
            Line((-10.904033261, -14.780229024), (-10.211407865, -15.085718055))
            ThreePointArc((-10.211407865, -15.085718055), (-9.102240231, -15.648434986), (-8.060329257, -16.327643869))
        make_face(mode=Mode.SUBTRACT)
    extrude(amount=EXTRUDE_4_DEPTH)


solid = part.part
